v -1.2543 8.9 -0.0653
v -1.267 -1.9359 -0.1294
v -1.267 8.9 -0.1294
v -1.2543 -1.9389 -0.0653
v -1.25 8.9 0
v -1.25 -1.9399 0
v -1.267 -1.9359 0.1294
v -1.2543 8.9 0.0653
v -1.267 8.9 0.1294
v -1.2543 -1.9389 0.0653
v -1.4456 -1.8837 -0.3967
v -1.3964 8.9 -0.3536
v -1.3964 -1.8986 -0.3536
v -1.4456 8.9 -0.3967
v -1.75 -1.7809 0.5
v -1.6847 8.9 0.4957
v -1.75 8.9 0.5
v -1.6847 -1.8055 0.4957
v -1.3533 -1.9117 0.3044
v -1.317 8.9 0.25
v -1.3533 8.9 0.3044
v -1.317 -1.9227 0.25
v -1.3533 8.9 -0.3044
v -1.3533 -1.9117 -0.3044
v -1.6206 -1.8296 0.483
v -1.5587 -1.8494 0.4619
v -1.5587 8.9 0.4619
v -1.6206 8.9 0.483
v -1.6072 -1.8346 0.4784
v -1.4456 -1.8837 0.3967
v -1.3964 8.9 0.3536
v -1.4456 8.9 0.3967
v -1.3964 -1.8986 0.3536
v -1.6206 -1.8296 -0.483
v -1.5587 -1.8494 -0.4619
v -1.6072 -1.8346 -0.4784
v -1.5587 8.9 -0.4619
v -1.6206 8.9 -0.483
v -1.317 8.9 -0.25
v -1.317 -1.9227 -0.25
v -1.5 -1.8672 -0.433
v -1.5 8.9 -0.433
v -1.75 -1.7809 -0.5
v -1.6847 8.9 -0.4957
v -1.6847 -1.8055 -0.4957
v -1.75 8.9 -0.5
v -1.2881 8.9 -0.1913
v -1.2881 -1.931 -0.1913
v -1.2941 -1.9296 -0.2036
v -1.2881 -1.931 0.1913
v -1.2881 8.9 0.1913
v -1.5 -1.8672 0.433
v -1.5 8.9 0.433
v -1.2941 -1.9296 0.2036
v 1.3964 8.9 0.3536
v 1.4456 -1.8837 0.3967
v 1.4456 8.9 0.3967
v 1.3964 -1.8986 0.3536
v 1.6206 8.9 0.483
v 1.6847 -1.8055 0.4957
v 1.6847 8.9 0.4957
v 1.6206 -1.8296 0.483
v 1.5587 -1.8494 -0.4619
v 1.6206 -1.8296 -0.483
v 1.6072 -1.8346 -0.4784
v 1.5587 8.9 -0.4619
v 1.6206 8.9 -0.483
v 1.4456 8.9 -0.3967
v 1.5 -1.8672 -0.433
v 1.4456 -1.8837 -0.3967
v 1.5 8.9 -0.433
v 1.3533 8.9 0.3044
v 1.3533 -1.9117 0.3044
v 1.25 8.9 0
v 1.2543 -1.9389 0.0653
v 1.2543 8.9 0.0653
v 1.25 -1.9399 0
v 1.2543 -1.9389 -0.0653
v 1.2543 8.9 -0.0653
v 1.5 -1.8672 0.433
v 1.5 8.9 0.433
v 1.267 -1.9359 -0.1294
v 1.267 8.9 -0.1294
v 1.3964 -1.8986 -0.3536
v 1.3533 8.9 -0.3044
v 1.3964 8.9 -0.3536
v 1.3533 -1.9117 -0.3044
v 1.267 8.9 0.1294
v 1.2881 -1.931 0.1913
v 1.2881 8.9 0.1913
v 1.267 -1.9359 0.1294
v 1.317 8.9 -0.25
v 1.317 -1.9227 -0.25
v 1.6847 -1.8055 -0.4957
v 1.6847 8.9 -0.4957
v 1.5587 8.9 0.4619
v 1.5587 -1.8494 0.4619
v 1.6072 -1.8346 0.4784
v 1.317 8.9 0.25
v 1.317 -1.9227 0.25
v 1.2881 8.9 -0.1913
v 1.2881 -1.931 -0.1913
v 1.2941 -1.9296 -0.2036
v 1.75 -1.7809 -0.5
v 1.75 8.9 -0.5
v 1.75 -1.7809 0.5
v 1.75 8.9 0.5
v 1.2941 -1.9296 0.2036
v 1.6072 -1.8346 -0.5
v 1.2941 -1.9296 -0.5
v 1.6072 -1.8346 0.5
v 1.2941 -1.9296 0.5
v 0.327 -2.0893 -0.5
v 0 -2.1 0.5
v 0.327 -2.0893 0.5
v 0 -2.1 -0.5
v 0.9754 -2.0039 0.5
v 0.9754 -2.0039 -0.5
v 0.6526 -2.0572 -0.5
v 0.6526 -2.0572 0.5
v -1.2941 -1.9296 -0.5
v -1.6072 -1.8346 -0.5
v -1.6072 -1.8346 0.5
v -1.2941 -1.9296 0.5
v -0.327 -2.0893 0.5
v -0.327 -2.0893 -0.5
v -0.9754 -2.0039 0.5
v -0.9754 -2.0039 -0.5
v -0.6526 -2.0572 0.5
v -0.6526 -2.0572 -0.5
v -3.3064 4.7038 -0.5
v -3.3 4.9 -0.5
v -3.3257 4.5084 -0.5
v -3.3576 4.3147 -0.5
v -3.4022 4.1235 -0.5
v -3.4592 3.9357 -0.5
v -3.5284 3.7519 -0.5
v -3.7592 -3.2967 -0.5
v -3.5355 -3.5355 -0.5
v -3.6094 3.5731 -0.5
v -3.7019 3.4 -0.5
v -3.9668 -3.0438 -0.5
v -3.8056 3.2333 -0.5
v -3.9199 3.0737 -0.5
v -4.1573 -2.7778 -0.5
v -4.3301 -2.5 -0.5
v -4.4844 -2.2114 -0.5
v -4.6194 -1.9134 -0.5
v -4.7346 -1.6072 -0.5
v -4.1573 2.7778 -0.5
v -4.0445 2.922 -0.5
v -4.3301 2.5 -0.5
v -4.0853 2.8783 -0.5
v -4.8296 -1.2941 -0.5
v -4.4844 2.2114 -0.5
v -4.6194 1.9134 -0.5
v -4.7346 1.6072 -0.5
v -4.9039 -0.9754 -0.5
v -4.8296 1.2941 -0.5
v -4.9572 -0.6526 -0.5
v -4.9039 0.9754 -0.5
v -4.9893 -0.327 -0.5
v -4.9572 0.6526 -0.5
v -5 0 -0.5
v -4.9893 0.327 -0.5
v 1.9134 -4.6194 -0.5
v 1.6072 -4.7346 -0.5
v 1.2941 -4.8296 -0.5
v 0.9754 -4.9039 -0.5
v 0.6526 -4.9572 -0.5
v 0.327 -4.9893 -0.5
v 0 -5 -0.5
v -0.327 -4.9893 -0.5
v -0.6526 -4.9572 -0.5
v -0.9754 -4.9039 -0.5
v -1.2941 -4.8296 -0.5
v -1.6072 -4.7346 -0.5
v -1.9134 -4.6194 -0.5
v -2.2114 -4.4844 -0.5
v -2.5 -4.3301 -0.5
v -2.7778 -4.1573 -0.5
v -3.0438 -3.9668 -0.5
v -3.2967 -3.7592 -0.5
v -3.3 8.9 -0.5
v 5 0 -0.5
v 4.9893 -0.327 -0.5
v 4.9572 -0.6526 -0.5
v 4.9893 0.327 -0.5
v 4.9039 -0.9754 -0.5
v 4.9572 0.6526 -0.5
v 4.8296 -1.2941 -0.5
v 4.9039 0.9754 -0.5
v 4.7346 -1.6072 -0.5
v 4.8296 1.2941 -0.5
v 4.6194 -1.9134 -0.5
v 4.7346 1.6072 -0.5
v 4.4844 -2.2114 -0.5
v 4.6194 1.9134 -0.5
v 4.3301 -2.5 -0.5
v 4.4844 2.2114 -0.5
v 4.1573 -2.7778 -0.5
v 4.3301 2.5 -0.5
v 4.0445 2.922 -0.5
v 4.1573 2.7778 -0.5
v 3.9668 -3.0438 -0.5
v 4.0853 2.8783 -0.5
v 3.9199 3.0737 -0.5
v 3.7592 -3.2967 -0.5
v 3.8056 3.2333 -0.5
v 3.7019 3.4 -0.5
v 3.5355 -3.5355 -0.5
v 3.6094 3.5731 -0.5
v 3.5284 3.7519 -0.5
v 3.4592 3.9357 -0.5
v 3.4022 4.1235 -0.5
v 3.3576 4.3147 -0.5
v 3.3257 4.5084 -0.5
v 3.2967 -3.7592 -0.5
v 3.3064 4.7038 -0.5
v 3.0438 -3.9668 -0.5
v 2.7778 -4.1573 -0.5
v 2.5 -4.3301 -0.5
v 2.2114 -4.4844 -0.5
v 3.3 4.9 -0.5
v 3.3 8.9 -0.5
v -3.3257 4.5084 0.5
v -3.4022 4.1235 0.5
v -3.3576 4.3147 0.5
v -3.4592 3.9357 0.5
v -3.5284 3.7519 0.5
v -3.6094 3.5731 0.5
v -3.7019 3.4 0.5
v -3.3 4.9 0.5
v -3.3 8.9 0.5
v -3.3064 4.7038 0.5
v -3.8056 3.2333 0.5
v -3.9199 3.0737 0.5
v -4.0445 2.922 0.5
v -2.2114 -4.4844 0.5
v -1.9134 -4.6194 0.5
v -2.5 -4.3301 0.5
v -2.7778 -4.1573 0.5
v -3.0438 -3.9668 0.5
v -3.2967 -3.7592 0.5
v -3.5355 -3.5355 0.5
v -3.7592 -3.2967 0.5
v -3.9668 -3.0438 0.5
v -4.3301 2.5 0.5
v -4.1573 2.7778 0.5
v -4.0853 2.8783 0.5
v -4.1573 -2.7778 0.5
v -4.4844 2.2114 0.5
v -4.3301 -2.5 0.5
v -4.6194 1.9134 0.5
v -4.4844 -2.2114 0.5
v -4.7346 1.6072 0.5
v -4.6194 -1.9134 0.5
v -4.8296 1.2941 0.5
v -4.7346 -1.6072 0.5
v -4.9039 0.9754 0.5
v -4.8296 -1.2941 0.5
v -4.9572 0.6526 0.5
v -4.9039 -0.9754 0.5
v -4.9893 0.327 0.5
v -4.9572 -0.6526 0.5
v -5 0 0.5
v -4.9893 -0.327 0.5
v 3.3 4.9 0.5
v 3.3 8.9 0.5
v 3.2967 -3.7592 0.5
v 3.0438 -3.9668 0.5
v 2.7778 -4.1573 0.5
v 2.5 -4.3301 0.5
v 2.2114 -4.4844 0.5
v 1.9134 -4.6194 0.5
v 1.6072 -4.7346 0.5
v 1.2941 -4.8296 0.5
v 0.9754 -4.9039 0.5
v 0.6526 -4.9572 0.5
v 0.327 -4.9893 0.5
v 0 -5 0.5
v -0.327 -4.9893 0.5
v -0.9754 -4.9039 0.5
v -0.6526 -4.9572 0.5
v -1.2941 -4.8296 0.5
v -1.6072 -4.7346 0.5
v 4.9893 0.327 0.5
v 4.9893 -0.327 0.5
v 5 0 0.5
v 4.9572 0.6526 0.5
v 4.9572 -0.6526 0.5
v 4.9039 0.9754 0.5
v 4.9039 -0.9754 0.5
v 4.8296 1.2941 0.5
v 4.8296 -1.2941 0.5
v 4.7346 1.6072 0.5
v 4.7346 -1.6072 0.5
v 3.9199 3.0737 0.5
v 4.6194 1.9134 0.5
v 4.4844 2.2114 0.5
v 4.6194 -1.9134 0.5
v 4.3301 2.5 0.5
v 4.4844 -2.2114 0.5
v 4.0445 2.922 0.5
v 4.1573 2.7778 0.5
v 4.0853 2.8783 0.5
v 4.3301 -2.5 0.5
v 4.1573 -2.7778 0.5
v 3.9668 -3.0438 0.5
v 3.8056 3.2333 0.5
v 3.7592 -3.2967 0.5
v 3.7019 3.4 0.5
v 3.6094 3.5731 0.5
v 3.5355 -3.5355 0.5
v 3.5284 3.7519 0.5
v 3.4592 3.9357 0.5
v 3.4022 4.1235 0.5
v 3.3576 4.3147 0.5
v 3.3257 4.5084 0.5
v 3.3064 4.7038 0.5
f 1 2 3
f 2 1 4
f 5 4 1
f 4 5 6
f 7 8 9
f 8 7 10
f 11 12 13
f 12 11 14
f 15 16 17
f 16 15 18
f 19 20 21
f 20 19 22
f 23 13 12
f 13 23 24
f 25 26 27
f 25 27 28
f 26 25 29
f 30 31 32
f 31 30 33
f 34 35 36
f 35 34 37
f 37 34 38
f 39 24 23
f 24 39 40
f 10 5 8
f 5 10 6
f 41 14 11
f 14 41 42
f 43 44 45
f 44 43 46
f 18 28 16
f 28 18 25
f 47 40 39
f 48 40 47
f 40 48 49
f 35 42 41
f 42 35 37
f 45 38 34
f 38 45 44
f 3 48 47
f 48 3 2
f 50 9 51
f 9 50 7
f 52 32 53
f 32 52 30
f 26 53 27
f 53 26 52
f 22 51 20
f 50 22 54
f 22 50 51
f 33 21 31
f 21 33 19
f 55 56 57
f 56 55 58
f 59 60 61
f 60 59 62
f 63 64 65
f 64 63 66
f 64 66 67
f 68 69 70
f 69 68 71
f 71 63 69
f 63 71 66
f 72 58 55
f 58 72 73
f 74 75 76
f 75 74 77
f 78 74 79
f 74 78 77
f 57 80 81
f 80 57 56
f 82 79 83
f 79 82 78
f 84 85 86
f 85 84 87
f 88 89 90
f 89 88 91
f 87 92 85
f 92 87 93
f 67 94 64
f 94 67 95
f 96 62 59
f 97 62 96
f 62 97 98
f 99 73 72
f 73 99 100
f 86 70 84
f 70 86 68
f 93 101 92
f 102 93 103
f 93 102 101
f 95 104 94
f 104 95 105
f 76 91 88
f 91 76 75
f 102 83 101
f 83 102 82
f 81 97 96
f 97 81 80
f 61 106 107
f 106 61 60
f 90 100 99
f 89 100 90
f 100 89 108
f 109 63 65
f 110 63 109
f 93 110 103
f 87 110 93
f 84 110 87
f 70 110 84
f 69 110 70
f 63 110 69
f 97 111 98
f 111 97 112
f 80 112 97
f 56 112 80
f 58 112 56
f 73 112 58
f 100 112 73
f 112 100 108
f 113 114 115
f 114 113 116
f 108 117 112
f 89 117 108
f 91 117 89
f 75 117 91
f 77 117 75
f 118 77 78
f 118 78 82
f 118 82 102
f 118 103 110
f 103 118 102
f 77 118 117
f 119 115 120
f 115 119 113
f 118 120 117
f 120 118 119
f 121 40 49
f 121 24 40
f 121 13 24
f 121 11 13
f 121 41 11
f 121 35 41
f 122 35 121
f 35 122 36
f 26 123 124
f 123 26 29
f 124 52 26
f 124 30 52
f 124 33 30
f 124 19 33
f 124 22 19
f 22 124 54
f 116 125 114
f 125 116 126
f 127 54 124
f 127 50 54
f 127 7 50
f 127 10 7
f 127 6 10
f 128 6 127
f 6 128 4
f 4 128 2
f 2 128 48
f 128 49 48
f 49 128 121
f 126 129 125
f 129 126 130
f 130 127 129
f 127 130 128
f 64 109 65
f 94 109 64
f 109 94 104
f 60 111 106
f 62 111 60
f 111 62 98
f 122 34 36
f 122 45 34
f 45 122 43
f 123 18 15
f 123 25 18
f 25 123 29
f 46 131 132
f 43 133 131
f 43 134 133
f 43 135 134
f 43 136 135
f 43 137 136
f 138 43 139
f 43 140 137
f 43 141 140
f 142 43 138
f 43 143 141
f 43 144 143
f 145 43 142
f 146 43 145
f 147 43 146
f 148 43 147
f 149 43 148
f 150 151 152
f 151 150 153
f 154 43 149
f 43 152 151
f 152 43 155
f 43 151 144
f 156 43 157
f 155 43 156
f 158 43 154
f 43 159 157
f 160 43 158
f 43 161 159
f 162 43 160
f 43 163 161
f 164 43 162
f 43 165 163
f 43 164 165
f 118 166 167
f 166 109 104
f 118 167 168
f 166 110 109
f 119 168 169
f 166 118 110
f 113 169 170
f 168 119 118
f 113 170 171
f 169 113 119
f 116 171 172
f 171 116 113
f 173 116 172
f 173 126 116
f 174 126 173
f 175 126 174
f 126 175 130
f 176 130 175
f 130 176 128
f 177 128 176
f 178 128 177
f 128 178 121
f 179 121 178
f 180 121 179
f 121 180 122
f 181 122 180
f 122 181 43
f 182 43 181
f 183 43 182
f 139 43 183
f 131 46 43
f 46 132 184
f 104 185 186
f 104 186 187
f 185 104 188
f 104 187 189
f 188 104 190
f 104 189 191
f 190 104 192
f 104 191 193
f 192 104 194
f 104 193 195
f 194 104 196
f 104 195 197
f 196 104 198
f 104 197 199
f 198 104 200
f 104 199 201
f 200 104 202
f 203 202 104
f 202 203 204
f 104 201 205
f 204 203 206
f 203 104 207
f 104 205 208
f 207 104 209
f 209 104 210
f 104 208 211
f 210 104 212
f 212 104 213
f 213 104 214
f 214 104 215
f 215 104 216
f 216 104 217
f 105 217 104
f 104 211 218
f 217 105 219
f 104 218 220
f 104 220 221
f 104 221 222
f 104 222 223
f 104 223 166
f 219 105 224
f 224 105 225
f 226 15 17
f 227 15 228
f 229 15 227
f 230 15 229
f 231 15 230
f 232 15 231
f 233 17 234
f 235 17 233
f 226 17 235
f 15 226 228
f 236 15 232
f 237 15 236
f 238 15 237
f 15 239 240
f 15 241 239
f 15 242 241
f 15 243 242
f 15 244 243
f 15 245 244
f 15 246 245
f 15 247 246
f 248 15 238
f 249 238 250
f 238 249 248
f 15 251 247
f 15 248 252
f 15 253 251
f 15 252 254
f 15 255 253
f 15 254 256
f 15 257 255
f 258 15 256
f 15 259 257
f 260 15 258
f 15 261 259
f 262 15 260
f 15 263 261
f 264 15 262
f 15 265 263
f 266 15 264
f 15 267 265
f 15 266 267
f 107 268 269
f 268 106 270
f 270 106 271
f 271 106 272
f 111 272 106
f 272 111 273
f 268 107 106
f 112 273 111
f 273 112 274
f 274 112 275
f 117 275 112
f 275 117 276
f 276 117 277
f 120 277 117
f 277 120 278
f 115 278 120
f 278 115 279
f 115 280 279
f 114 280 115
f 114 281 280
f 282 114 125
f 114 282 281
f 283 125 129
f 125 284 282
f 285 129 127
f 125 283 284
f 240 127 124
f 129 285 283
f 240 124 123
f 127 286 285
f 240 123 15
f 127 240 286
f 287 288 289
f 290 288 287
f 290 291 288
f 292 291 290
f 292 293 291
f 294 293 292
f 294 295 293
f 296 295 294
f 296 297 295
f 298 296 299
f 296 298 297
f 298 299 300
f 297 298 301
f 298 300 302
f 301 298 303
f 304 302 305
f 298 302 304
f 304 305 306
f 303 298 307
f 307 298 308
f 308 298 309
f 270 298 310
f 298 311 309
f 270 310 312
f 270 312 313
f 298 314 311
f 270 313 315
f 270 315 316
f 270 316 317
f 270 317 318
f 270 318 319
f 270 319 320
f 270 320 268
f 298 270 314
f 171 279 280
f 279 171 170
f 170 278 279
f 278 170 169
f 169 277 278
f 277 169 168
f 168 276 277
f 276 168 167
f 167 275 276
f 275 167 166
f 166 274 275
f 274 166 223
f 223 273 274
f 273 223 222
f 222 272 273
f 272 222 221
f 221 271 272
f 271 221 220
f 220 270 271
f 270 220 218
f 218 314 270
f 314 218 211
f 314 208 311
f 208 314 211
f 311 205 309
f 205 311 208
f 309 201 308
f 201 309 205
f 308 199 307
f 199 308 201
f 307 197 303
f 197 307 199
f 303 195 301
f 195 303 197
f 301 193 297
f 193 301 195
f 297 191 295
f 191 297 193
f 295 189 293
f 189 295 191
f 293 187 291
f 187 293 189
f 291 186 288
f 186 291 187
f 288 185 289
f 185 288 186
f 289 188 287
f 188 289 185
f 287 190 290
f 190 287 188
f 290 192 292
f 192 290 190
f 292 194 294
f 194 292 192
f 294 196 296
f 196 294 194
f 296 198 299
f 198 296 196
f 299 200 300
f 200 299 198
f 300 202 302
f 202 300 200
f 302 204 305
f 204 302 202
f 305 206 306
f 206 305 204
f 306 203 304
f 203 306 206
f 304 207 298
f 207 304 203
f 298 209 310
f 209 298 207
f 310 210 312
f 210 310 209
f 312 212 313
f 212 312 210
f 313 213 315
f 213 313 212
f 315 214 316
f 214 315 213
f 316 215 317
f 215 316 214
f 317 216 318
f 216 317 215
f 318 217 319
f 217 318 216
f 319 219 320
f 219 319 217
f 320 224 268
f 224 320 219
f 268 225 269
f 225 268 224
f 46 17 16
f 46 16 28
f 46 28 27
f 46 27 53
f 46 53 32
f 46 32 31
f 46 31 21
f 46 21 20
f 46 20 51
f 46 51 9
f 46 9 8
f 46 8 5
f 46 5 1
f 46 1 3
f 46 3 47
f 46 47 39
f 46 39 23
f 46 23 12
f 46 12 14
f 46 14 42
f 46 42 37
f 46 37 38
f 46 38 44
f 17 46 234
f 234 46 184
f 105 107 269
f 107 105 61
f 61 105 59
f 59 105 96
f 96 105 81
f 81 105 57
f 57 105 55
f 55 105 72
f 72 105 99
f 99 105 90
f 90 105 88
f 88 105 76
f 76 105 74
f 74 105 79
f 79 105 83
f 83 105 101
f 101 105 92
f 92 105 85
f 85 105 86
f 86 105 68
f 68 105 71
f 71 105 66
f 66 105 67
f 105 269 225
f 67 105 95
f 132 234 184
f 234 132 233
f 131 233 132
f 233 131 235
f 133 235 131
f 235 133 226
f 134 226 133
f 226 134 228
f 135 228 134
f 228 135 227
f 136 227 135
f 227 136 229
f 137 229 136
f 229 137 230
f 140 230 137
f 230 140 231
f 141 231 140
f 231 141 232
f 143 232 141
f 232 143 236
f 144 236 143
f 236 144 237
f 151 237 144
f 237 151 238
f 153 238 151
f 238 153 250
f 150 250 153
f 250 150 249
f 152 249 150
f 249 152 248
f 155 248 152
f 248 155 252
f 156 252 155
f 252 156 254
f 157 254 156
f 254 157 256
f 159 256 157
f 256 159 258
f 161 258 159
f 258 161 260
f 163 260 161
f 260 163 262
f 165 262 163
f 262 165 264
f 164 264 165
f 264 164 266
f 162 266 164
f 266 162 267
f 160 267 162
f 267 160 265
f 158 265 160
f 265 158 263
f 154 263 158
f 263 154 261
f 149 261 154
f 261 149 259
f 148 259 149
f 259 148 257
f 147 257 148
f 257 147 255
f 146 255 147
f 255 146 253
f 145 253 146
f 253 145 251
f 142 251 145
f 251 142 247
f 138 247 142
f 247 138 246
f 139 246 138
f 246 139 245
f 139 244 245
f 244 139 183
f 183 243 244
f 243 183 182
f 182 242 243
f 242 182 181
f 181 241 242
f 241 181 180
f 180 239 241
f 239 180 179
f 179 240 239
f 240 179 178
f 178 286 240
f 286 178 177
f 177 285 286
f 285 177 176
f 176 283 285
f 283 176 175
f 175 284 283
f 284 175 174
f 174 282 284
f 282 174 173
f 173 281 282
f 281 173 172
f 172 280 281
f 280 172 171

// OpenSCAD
// part_id: cp-f6
// name: Fork 3W 10L 6D 10T
// source_drawing_ids: DRW-005
// units: mm
// revision: 0.1
// SPDX-License-Identifier: MIT

module cpf6_slot_profile_2d() {
    slot_offset_y = 2.9;

    translate([0, slot_offset_y])
    union() {
        intersection() {
            circle(r = 5.0, $fn = 96);
            rotate([0, 0, 90])
                square([10.0, 3.5], center = true);
        }

        translate([-1.75, 0])
            square([3.5, 8.0], center = false);
    }
}

module cpf6_outer_fill_2d() {
    tongue_w = 6.6;
    tongue_h = 6.0;
    tongue_bottom_y = 2.9;
    shoulder_fill_w = 2.0;
    shoulder_fill_h = 2.0;

    union() {
        circle(r = 5.0, $fn = 96);

        translate([-tongue_w / 2, tongue_bottom_y])
            square([tongue_w, tongue_h], center = false);

        translate([tongue_w / 2, tongue_bottom_y])
            square([shoulder_fill_w, shoulder_fill_h], center = false);
        translate([-tongue_w / 2 - shoulder_fill_w, tongue_bottom_y])
            square([shoulder_fill_w, shoulder_fill_h], center = false);
    }
}

module cpf6_outer_profile_2d() {
    tongue_w = 6.6;
    shoulder_r = 3.0;
    shoulder_center_y = 4.9;
    shoulder_center_x = tongue_w / 2 + shoulder_r;

    difference() {
        cpf6_outer_fill_2d();

        translate([shoulder_center_x, shoulder_center_y])
            circle(r = shoulder_r, $fn = 96);
        translate([-shoulder_center_x, shoulder_center_y])
            circle(r = shoulder_r, $fn = 96);
    }
}

module cpf6_slot_negative_3d(th = 1.0) {
    difference() {
        linear_extrude(height = th + 0.1, center = true)
            cpf6_slot_profile_2d();

        for (side = [-1, 1]) {
            translate([side * 1.75, -4.9, 0])
                rotate([-90, 0, 0])
                    cylinder(r = 0.5, h = 14.0, $fn = 48);
        }
    }
}

module part_cpf6(th = 1.0) {
    color([0.18, 0.42, 0.78])
    difference() {
        linear_extrude(height = th, center = true)
            cpf6_outer_profile_2d();

        cpf6_slot_negative_3d(th);
    }
}

// ---- "main guard" ----
// Default to previewing when opened directly:
if (is_undef(__LIB_MODE__)) {
    part_cpf6();
}
